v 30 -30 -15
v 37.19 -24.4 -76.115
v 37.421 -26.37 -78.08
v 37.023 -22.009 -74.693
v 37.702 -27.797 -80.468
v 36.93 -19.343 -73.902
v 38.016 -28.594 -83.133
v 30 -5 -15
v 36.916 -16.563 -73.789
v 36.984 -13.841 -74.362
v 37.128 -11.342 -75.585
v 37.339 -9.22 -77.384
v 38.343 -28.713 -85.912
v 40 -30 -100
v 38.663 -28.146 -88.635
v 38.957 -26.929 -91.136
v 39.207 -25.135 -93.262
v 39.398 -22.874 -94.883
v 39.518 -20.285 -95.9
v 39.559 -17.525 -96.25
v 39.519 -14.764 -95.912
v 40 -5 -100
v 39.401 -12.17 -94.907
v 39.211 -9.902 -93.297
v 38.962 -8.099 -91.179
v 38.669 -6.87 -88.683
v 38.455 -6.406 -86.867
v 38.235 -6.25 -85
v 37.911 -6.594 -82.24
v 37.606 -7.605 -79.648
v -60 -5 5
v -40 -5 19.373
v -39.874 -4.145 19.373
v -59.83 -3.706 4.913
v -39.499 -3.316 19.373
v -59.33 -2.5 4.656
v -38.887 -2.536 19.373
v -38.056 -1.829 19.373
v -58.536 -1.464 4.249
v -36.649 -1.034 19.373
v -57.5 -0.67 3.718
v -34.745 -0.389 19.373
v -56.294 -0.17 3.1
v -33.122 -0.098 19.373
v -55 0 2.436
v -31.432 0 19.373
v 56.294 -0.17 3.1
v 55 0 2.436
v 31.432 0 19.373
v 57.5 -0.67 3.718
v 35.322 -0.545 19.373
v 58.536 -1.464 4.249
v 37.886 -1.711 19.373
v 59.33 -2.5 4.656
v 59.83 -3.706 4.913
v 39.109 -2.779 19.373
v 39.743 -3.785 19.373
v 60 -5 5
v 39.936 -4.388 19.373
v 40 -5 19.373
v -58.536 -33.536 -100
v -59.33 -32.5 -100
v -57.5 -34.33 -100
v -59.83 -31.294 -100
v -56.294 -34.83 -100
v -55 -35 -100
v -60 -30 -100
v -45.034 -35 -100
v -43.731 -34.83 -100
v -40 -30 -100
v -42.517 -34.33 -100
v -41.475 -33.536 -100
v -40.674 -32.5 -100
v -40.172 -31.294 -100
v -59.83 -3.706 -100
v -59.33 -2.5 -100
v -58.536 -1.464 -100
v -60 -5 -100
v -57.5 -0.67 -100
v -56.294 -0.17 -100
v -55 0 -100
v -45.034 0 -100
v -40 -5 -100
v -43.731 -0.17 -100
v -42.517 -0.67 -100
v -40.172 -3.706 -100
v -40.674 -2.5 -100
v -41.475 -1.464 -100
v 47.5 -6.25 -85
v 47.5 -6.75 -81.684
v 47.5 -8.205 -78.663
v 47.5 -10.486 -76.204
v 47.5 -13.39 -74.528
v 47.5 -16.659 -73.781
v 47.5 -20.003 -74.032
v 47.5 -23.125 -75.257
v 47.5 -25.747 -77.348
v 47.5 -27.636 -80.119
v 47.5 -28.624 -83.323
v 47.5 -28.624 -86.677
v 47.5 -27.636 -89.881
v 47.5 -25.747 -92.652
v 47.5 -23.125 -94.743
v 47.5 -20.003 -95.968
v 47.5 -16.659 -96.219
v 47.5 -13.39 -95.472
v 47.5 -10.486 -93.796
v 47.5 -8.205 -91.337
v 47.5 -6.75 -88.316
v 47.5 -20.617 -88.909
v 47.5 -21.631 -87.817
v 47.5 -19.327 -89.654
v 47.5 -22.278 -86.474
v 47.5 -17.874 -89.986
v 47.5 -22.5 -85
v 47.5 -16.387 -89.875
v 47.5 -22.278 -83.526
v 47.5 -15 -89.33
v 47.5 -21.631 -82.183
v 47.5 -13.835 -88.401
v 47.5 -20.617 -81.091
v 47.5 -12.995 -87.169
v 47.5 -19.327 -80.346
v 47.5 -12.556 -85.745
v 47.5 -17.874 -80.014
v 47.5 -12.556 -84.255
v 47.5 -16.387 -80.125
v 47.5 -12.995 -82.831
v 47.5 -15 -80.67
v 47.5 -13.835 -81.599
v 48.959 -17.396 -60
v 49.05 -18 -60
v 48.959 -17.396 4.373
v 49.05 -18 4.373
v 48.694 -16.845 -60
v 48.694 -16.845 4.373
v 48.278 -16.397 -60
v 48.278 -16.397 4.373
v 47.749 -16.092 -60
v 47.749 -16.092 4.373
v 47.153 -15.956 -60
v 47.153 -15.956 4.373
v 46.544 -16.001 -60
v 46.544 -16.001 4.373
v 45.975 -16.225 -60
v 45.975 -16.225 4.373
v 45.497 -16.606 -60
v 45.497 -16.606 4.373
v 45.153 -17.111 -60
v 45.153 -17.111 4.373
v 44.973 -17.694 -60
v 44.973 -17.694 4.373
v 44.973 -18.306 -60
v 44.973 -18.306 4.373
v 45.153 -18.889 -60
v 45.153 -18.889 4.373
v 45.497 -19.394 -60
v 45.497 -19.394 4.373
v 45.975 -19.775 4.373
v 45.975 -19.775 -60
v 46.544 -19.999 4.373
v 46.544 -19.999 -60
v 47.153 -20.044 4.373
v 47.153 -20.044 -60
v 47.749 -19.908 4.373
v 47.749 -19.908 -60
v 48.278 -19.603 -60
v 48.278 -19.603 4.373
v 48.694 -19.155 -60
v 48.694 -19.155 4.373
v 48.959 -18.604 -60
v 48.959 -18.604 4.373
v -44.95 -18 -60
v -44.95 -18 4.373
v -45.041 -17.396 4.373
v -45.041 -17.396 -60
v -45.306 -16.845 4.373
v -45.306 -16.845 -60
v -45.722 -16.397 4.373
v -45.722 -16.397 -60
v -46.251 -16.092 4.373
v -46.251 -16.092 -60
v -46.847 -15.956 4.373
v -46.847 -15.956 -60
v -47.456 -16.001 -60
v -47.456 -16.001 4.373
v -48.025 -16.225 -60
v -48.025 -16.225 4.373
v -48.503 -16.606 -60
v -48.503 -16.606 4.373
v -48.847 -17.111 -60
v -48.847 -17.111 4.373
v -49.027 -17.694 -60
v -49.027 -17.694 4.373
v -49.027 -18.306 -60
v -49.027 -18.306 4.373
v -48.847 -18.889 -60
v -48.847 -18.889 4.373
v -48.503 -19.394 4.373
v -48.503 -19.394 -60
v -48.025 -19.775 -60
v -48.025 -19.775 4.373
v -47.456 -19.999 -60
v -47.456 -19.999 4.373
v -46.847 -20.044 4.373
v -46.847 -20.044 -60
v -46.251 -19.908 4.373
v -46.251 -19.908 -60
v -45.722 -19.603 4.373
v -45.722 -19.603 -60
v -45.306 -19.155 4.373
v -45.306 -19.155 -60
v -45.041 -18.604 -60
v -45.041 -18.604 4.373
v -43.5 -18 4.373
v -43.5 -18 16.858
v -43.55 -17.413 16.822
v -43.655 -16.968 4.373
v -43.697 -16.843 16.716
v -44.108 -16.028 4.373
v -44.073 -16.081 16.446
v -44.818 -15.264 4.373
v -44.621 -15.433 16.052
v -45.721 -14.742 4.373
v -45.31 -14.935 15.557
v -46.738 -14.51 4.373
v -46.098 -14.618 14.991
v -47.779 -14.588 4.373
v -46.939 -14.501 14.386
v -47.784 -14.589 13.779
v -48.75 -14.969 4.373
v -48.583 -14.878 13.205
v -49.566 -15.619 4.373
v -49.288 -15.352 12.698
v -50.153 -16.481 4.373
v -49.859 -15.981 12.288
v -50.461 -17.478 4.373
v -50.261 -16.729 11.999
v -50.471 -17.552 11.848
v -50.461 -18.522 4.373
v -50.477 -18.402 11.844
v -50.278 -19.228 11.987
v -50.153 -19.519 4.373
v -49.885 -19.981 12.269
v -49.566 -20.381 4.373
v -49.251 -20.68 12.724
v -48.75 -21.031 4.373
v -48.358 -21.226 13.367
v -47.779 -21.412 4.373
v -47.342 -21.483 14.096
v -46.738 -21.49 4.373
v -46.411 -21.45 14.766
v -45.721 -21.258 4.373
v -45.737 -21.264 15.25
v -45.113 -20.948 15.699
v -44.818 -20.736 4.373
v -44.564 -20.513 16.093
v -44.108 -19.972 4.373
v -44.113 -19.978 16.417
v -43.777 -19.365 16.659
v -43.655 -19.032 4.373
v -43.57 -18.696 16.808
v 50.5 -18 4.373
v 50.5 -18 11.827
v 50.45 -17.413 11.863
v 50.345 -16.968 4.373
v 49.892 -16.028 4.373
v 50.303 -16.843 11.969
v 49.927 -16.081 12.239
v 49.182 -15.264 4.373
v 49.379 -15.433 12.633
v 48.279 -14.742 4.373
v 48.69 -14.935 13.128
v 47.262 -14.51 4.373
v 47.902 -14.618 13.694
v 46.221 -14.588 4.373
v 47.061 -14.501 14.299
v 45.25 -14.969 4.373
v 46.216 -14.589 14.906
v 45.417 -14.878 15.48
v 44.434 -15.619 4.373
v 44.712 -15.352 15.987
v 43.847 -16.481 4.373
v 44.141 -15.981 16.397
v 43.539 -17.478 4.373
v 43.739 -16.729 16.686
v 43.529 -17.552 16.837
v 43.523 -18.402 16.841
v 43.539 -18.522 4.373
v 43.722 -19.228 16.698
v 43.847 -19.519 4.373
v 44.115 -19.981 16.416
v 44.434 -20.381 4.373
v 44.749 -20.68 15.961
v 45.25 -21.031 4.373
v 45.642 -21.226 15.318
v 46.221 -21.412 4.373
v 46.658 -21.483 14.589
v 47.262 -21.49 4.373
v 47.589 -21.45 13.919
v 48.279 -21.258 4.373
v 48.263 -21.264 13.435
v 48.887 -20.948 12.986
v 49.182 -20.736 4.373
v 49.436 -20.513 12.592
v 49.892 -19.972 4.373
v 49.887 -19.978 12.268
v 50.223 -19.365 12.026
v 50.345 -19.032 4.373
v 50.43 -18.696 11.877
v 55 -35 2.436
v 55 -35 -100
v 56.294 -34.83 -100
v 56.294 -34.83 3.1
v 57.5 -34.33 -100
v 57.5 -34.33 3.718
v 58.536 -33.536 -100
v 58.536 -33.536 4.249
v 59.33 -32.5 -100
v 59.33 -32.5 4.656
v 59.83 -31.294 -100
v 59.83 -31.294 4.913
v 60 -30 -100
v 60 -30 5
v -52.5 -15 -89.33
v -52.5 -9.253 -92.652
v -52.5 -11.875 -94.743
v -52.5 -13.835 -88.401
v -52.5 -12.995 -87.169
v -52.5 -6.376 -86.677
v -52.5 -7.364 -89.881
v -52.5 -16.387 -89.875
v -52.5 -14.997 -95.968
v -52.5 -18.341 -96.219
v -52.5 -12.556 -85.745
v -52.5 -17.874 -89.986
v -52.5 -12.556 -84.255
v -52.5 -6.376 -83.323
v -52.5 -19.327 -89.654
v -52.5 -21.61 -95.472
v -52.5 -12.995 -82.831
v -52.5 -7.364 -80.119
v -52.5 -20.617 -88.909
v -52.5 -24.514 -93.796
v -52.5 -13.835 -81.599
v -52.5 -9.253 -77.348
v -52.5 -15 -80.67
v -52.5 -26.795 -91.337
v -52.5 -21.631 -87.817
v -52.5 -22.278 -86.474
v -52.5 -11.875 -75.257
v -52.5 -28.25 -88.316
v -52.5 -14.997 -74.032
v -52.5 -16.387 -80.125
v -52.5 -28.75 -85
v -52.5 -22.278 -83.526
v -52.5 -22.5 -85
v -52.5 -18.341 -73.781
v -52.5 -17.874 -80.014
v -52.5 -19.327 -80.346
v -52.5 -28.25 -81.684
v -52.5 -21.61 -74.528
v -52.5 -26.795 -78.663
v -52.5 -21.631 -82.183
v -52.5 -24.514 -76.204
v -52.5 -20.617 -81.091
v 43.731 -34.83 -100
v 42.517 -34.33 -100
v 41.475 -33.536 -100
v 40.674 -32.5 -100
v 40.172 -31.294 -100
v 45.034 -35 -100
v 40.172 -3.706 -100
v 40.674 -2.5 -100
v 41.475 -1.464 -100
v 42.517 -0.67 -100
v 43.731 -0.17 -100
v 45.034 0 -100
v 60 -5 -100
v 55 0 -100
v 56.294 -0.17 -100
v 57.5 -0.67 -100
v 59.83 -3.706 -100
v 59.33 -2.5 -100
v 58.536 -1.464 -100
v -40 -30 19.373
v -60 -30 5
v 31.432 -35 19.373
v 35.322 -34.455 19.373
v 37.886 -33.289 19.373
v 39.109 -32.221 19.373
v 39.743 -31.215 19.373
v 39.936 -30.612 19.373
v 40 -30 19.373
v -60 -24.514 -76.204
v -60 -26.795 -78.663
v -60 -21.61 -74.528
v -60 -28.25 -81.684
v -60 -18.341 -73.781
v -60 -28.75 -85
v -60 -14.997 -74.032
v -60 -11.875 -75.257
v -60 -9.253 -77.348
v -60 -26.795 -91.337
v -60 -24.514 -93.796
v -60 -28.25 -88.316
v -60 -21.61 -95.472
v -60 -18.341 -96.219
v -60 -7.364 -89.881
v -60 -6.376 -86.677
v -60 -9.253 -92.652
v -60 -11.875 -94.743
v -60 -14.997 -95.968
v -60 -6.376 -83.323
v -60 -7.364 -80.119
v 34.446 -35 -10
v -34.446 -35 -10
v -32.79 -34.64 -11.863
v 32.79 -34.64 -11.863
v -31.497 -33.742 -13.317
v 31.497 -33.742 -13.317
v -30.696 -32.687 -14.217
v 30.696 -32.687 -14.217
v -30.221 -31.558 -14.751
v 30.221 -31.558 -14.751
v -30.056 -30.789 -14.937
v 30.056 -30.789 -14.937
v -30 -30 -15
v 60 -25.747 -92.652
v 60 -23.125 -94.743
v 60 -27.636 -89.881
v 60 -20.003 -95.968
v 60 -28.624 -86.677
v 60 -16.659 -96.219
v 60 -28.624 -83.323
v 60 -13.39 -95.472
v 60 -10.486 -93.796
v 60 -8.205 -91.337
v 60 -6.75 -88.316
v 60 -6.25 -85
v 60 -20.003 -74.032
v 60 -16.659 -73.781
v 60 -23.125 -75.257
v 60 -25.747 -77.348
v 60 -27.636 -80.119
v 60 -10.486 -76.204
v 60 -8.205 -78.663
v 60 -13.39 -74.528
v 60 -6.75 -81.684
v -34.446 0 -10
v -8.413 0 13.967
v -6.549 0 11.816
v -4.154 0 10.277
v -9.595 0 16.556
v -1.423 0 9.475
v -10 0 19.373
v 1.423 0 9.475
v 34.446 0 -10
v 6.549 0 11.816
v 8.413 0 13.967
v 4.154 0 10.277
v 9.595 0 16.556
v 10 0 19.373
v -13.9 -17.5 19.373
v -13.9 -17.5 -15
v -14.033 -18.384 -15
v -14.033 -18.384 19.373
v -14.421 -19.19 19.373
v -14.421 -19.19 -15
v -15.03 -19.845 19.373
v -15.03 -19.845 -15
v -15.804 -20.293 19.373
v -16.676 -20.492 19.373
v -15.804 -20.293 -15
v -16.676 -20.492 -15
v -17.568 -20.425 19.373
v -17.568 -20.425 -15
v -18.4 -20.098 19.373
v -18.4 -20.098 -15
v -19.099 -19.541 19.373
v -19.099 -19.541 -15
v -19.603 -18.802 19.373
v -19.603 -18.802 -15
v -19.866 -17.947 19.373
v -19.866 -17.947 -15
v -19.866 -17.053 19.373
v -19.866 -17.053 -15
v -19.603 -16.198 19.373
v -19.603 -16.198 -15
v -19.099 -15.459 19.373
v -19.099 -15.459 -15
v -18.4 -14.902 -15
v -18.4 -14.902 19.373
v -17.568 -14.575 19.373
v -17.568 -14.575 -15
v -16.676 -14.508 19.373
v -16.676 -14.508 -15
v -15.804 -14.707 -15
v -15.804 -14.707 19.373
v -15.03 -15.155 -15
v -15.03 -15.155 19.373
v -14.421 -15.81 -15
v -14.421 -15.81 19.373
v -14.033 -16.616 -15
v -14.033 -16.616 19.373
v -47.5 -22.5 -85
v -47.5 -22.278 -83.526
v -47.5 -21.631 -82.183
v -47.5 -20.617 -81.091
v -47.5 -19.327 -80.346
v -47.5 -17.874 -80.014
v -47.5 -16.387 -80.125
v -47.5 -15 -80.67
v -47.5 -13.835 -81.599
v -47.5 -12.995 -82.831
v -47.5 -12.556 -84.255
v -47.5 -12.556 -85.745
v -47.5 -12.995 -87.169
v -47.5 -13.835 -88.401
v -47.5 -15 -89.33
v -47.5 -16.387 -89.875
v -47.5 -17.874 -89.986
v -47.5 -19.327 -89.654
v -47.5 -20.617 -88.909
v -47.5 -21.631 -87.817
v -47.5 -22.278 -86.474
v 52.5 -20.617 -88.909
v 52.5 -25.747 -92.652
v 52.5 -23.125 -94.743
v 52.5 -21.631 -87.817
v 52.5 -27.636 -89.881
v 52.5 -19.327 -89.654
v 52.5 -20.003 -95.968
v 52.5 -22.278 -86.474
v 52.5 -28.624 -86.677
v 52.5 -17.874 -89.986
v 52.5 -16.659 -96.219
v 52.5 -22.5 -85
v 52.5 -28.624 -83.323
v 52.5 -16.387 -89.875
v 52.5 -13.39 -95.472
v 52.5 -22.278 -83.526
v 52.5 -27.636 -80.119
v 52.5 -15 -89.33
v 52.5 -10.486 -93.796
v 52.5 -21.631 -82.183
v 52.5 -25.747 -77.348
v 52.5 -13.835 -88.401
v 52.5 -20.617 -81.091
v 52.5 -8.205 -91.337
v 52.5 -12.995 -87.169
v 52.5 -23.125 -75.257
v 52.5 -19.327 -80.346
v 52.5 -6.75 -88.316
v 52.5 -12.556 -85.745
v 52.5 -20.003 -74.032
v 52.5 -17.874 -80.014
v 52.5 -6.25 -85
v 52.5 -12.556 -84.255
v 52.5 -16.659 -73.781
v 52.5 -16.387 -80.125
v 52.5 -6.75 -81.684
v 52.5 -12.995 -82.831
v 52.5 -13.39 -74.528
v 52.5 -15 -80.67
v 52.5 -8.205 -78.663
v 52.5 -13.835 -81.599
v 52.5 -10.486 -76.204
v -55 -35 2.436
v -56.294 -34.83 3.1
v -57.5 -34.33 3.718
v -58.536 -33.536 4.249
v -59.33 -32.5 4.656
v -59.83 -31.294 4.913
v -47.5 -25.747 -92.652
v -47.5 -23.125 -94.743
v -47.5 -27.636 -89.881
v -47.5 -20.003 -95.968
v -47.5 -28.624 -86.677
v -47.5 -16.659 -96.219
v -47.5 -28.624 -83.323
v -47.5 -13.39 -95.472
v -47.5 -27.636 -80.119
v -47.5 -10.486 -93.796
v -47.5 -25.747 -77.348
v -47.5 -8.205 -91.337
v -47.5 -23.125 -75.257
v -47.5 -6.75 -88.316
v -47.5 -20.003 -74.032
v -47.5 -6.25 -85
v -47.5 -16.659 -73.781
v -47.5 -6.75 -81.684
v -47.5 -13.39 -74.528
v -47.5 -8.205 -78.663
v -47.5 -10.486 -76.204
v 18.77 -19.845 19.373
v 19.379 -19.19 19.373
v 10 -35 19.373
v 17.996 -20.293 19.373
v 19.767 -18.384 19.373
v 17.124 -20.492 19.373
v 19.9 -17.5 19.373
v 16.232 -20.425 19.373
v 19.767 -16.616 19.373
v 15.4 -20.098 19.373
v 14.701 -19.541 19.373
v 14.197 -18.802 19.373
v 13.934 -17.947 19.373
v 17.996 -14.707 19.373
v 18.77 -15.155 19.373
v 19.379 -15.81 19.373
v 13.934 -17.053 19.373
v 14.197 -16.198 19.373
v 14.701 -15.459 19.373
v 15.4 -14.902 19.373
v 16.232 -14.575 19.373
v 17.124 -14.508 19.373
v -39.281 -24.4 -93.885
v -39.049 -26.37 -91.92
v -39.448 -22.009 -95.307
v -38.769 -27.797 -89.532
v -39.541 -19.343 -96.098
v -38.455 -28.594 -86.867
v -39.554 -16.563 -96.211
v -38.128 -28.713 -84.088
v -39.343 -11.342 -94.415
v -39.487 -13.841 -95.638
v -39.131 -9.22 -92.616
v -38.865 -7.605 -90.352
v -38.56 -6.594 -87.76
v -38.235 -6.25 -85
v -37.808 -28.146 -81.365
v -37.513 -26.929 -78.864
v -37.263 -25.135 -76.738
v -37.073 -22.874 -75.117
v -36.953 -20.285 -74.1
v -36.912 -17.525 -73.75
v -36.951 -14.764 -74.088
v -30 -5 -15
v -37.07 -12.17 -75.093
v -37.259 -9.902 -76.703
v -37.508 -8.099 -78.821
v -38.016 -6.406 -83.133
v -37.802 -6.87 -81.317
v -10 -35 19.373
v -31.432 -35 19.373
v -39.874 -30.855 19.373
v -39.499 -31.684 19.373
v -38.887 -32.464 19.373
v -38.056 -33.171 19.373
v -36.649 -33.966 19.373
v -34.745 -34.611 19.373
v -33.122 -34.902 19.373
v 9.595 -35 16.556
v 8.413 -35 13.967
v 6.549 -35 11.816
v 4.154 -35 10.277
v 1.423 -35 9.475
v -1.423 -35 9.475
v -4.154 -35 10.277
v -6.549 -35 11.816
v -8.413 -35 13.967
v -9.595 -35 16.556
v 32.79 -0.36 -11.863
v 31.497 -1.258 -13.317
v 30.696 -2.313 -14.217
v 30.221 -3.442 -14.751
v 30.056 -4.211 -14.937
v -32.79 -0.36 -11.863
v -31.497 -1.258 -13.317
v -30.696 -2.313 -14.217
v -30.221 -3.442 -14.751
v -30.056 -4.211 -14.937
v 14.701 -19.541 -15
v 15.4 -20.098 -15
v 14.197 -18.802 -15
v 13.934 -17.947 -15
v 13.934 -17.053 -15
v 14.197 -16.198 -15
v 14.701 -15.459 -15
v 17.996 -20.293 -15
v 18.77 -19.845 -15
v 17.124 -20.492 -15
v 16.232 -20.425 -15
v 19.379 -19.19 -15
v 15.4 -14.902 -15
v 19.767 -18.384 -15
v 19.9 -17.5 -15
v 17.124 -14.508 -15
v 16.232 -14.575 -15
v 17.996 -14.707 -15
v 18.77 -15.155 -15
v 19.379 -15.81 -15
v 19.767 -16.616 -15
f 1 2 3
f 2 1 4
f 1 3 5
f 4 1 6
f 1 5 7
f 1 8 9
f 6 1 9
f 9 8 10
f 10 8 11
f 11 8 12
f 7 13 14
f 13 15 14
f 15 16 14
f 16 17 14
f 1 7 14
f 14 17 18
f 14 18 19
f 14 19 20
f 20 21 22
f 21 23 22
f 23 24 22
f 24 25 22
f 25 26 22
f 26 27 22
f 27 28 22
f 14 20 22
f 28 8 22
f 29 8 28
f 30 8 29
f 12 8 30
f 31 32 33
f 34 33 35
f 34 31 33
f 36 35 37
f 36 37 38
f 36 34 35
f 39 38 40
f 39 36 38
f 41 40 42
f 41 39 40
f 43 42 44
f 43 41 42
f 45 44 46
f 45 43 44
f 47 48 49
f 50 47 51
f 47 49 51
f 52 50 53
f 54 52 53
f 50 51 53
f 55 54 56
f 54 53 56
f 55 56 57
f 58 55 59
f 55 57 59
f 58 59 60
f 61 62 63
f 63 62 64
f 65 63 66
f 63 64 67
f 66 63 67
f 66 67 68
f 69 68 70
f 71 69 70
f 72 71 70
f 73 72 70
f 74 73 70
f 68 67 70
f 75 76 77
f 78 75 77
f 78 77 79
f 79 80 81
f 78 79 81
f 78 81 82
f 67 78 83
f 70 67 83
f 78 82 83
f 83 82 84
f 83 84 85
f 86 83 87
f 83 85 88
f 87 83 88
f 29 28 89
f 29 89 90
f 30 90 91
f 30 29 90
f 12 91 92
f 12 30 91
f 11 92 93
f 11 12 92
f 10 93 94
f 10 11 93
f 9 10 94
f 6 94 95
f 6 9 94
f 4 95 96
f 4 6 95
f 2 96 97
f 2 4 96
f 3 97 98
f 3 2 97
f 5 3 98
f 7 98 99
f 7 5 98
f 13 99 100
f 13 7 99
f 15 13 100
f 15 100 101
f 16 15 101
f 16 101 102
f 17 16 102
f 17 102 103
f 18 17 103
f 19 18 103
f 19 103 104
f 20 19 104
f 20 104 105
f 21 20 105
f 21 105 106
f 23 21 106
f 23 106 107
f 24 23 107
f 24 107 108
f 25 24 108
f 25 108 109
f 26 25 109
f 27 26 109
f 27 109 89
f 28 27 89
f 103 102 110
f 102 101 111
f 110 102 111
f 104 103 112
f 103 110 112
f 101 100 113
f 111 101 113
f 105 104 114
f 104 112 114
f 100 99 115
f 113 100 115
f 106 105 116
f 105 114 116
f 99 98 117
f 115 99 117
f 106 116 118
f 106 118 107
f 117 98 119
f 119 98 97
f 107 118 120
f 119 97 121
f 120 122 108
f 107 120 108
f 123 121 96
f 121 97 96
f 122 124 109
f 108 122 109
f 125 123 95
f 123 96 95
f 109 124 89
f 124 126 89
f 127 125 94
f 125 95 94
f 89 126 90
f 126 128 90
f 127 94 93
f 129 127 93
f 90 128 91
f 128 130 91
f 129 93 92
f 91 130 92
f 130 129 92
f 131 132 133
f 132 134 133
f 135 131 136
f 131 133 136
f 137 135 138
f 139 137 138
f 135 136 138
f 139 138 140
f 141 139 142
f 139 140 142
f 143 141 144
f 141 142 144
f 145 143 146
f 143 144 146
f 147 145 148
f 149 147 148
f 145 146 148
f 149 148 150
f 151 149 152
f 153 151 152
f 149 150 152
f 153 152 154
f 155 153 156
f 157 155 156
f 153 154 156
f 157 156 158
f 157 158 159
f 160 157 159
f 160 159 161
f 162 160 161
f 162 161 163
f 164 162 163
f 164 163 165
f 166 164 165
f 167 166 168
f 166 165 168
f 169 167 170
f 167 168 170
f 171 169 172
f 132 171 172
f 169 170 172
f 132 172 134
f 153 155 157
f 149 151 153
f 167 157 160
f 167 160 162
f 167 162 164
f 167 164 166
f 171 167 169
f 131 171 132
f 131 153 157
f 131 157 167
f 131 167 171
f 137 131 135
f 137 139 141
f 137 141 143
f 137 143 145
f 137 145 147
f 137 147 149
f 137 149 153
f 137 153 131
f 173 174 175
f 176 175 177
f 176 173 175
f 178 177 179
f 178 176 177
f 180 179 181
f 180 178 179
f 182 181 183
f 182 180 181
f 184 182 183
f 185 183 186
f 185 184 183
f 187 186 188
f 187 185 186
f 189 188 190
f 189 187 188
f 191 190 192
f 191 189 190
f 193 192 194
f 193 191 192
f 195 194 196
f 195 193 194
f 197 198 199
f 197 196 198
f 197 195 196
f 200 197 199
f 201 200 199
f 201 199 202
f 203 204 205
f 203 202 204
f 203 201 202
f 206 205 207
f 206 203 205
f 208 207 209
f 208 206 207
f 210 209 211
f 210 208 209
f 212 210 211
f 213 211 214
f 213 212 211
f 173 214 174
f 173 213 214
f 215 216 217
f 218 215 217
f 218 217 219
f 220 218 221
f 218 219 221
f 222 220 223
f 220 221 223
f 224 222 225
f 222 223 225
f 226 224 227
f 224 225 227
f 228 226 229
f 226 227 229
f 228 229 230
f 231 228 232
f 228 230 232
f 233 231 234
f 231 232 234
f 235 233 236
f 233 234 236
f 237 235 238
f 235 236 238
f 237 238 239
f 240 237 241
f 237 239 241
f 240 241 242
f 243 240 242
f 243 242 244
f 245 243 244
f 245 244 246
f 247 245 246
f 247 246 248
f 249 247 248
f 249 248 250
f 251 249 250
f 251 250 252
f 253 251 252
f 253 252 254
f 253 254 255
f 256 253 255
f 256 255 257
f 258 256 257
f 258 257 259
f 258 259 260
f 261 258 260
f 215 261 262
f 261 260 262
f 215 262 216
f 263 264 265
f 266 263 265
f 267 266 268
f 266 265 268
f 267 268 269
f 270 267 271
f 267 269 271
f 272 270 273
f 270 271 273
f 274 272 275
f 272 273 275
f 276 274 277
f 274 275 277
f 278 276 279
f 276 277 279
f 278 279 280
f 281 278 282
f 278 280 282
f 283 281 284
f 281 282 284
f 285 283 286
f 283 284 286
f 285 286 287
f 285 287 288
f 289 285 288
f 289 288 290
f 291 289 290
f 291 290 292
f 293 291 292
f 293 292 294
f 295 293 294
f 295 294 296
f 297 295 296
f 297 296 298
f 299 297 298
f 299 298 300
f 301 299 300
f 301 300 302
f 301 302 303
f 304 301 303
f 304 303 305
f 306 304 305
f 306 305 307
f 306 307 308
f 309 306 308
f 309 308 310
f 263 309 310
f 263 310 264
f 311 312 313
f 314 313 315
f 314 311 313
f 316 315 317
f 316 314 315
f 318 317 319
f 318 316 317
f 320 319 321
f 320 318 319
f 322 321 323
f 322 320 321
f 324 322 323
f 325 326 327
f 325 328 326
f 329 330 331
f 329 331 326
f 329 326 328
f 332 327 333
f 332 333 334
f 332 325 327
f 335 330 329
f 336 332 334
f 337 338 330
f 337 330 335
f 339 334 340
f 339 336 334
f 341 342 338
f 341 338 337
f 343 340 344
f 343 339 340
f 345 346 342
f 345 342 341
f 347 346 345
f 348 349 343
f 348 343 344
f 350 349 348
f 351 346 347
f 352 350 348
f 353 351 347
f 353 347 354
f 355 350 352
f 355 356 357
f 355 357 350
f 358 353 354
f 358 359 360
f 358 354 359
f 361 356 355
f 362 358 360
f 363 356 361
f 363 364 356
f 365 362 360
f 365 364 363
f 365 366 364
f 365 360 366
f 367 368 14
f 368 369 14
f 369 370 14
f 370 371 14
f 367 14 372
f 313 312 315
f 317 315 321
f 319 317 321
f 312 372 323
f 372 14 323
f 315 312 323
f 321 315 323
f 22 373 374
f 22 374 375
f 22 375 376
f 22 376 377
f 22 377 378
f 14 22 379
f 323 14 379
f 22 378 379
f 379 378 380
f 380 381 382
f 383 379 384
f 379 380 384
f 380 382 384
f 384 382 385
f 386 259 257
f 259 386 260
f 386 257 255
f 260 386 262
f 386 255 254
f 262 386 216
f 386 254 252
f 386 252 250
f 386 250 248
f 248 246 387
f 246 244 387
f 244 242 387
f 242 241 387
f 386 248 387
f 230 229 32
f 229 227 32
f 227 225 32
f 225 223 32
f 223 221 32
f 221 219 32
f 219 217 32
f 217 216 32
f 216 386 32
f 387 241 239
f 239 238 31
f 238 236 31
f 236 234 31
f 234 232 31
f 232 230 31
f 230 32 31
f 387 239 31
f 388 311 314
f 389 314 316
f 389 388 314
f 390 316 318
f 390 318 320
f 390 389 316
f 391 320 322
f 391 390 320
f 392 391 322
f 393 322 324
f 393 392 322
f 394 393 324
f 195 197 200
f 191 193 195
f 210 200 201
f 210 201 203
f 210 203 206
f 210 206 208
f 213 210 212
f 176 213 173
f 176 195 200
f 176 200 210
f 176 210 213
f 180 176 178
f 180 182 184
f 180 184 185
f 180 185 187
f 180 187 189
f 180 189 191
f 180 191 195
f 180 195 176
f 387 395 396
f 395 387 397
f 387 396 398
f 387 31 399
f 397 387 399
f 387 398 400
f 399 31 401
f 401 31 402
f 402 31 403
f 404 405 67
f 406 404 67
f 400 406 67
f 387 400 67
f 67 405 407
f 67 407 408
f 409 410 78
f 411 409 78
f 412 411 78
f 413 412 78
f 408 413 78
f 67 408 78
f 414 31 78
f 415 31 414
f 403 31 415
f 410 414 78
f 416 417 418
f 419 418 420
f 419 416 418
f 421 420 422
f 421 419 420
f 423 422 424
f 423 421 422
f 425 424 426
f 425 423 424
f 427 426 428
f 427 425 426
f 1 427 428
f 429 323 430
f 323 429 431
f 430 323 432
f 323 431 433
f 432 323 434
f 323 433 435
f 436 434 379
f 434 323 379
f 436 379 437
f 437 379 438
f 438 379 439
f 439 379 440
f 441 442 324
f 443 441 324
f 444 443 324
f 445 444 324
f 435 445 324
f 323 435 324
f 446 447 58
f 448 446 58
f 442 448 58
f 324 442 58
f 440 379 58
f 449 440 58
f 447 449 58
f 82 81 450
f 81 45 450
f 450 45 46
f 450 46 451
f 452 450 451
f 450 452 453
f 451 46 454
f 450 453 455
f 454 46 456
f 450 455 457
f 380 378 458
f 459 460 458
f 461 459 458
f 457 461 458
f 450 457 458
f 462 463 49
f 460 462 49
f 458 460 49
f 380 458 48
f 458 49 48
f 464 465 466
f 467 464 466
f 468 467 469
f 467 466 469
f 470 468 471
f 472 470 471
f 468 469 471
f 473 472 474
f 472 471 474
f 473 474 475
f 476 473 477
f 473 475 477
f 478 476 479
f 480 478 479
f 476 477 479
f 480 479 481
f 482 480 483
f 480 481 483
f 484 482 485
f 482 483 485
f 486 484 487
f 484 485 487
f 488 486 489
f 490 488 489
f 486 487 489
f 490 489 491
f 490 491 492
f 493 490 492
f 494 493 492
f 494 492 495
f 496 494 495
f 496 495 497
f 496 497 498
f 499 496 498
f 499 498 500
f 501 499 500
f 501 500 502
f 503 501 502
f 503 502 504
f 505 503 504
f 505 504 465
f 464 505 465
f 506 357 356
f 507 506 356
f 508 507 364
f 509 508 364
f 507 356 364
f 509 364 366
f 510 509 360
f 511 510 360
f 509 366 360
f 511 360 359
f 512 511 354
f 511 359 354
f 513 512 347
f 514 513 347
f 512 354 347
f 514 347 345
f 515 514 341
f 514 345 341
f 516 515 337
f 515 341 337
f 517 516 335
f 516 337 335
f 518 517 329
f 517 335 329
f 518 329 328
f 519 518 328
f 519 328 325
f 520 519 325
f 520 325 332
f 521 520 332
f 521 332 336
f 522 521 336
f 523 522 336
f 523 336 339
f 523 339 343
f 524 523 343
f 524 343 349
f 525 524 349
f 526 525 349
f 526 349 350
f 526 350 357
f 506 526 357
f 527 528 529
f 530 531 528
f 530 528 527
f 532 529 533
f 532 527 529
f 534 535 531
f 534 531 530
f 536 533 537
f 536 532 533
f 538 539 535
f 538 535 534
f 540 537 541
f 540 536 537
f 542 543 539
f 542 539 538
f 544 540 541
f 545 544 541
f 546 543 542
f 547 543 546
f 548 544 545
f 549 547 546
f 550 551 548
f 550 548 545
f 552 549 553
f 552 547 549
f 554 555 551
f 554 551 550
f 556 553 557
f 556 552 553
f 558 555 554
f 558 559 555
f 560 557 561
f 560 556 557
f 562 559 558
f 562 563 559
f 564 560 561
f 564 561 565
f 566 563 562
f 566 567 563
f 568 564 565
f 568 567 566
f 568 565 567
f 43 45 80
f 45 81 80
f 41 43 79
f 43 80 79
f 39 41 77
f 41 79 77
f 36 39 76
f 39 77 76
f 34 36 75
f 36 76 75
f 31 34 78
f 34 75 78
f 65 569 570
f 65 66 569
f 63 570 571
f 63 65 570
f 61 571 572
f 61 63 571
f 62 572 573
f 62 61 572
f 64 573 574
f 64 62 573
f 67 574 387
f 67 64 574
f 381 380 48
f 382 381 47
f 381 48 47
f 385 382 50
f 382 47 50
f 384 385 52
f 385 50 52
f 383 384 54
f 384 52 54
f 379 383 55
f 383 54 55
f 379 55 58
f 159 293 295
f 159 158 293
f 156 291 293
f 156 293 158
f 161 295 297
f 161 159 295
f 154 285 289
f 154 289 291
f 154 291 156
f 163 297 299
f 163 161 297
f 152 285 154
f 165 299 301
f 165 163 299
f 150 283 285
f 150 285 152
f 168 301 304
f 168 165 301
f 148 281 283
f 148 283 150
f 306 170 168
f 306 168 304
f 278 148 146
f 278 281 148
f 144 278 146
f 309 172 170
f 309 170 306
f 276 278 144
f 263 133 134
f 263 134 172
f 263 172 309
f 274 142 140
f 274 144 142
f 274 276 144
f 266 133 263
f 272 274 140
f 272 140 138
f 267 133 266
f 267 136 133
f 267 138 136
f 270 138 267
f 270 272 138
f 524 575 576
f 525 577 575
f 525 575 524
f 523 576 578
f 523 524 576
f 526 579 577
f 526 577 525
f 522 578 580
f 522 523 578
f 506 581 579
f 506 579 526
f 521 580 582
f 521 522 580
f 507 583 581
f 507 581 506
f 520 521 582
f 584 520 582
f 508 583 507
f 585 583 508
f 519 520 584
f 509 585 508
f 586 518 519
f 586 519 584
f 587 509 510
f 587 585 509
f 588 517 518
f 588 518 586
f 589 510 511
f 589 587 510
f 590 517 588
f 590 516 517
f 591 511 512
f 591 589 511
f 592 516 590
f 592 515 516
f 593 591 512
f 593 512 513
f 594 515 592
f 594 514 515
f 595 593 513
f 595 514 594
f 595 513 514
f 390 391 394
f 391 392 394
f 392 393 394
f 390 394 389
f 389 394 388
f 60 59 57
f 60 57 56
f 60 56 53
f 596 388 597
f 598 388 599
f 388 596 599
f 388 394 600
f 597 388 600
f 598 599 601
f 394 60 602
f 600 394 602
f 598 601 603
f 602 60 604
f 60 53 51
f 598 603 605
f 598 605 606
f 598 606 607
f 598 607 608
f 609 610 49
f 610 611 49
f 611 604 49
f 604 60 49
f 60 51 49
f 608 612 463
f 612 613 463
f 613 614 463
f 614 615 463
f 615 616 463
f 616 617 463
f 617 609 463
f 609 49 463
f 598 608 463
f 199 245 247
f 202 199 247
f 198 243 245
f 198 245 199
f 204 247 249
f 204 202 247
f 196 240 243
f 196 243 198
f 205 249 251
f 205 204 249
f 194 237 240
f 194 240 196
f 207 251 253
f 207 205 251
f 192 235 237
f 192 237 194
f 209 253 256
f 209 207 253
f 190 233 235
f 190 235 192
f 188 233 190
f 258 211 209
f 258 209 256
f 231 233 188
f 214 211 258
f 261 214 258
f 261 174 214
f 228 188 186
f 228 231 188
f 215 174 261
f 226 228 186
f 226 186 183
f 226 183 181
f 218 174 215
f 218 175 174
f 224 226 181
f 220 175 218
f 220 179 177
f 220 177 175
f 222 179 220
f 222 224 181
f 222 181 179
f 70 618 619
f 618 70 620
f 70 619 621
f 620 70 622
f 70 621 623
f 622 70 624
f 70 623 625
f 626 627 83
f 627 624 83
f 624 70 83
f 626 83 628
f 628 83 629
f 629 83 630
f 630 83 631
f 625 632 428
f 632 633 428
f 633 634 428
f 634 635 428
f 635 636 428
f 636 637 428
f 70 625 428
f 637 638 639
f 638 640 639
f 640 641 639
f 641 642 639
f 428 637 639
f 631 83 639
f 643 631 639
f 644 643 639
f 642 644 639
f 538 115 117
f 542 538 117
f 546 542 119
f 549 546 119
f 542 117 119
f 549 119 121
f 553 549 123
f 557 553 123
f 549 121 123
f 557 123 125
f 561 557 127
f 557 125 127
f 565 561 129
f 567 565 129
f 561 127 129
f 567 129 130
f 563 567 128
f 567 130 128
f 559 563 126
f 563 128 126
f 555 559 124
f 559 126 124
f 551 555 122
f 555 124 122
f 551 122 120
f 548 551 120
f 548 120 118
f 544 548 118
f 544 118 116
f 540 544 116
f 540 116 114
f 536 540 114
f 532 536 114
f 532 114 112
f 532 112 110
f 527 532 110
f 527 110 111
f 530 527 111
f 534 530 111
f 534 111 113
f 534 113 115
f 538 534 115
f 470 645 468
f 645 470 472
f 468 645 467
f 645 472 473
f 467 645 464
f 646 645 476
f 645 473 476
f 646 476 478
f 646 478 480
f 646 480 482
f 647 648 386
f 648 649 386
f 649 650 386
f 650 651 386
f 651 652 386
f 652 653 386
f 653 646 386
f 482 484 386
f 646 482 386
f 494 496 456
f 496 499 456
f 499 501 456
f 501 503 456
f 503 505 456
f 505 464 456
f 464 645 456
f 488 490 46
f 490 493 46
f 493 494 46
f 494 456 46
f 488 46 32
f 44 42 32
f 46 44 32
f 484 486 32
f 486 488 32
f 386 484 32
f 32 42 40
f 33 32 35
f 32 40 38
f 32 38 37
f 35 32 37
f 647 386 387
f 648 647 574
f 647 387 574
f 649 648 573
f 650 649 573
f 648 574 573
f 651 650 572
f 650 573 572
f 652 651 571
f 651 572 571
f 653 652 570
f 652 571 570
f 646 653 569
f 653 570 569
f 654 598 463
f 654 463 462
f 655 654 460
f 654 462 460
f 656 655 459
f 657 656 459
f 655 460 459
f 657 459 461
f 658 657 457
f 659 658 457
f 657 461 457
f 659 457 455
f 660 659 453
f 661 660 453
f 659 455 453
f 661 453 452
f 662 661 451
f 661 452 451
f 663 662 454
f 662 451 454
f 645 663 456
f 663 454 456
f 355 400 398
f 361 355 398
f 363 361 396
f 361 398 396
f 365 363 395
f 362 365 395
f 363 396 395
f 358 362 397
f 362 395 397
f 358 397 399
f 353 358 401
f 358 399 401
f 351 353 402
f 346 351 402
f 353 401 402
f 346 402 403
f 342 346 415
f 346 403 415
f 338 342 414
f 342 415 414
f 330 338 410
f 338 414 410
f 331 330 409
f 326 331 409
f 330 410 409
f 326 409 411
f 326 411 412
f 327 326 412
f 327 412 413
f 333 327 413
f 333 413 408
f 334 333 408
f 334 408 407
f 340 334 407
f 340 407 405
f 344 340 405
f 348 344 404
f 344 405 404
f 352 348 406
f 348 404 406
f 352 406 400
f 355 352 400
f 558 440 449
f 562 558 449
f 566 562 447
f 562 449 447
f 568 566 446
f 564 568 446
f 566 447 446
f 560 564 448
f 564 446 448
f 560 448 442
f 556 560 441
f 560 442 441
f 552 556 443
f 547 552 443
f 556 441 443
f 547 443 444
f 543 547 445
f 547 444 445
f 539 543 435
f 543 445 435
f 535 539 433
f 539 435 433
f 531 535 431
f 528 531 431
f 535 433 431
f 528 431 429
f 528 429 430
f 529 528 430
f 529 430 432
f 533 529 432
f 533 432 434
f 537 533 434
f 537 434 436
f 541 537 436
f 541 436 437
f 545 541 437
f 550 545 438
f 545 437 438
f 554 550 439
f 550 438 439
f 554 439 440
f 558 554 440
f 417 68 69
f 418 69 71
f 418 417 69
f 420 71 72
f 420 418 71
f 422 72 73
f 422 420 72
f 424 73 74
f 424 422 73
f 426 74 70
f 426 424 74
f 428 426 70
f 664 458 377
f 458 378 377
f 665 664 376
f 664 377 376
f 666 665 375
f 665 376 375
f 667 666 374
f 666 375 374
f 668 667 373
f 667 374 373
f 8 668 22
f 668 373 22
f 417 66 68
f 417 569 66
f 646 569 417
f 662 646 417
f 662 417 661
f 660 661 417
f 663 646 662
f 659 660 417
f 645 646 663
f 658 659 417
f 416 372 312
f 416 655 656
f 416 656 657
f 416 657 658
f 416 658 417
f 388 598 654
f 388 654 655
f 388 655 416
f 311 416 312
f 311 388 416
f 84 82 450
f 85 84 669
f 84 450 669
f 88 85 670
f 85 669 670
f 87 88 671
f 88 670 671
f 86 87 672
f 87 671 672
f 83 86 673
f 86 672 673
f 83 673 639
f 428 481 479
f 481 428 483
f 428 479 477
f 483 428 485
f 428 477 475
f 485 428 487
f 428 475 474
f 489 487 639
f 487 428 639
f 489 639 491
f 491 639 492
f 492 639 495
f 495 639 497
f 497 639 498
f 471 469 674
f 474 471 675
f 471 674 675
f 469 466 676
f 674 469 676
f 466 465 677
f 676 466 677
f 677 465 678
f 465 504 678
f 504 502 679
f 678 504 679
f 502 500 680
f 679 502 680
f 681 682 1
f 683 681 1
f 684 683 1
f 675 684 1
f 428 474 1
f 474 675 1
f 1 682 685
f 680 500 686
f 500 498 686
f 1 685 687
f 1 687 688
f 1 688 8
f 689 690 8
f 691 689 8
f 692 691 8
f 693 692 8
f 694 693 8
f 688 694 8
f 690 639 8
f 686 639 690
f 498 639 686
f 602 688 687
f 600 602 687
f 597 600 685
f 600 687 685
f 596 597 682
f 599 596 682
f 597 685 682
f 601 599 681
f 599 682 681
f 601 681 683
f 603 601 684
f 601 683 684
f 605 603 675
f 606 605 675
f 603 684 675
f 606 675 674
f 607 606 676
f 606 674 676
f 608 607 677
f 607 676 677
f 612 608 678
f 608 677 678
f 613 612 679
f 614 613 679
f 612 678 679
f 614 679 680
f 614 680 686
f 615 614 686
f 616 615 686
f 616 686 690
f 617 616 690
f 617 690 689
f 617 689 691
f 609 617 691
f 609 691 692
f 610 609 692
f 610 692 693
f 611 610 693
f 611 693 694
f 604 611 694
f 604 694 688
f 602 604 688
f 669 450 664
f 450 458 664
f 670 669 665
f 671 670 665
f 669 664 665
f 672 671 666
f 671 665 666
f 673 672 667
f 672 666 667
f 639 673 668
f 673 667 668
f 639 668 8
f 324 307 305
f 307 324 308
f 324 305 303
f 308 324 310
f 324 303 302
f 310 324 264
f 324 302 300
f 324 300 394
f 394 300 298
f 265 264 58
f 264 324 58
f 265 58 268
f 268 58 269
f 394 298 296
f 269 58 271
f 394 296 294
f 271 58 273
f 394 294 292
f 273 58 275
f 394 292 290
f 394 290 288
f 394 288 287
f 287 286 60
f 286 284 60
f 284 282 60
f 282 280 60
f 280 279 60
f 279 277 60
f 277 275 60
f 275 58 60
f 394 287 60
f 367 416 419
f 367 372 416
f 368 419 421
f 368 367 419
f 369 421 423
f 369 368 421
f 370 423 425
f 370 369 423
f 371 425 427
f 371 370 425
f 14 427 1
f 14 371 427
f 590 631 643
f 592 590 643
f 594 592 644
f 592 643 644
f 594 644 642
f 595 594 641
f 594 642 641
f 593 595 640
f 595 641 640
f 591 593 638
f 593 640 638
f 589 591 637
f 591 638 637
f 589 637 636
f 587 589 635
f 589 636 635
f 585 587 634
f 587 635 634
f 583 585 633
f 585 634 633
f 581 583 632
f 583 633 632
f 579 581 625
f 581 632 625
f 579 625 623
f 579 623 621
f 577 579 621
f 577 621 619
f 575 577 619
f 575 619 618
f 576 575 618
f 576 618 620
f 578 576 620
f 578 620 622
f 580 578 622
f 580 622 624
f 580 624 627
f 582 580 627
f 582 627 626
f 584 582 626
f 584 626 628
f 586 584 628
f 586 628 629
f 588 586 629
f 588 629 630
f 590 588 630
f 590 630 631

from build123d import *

# Parameters (mm, degrees)
F1_DEPTH  = 35
F2_R      = 3
F3_DEPTH  = 34.3740698971
F4_R      = 5
F5_DEPTH  = 120.001
F6_R      = 11.25
F7_DEPTH  = 7.5
F8_R      = 11.25
F9_DEPTH  = 7.5
F10_R     = 11.25
F11_DEPTH = 47.5
F12_R     = 11.25
F13_DEPTH = 47.5
F14_R     = 2.05
F15_DEPTH = 60
F16_R     = 3.5
F17_DEPTH = 15
F18_R     = 5


with BuildPart() as f1:
    # F0 (on Front) → F1 (new body)
    with BuildSketch(Plane.XZ):
        with BuildLine():
            Line((-40, 19.3730698971), (-60, 5))
            Line((-60, 5), (-60, 0))
            Line((-60, 0), (-60, -100))
            Line((-60, -100), (-40, -100))
            Line((-40, -100), (-30, -15))
            Line((-30, -15), (0, -15))
            Line((0, -15), (30, -15))
            Line((30, -15), (40, -100))
            Line((40, -100), (60, -100))
            Line((60, -100), (60, 0))
            Line((60, 0), (60, 5))
            Line((60, 5), (40, 19.3730698971))
            Line((40, 19.3730698971), (10, 19.3730698971))
            ThreePointArc((10, 19.3730698971), (0, 9.3730698971), (-10, 19.3730698971))
            Line((-10, 19.3730698971), (-40, 19.3730698971))
        make_face()
    extrude(amount=F1_DEPTH)

    # F2 (on face) → F3 (cut, through all)
    with BuildSketch(Plane(origin=(0, 0, -15), x_dir=(1, 0, 0), z_dir=(0, 0, -1))):
        with Locations((-16.9, 17.5)):
            Circle(F2_R)
        with Locations((16.9, 17.5)):
            Circle(F2_R)
    extrude(amount=-F3_DEPTH, mode=Mode.SUBTRACT)

    # F4 (on face) → F5 (cut, through all)
    with BuildSketch(Plane(origin=(-60, 0, 0), x_dir=(0, -1, 0), z_dir=(-1, 0, 0))):
        with Locations((17.5, -85)):
            Circle(F4_R)
    extrude(amount=-F5_DEPTH, mode=Mode.SUBTRACT)

    # F6 (on face) → F7 (cut)
    with BuildSketch(Plane(origin=(-60, 0, 0), x_dir=(0, -1, 0), z_dir=(-1, 0, 0))):
        with Locations((17.5, -85)):
            Circle(F6_R)
    extrude(amount=-F7_DEPTH, mode=Mode.SUBTRACT)

    # F8 (on face) → F9 (cut)
    with BuildSketch(Plane.YZ.offset(60)):
        with Locations((-17.5, -85)):
            Circle(F8_R)
    extrude(amount=-F9_DEPTH, mode=Mode.SUBTRACT)

    # F10 (on Right) → F11 (cut)
    with BuildSketch(Plane.YZ):
        with Locations((-17.5, -85)):
            Circle(F10_R)
    extrude(amount=-F11_DEPTH, mode=Mode.SUBTRACT)

    # F12 (on Right) → F13 (cut)
    with BuildSketch(Plane.YZ):
        with Locations((-17.5, -85)):
            Circle(F12_R)
    extrude(amount=F13_DEPTH, mode=Mode.SUBTRACT)

    # F14 (on Top) → F15 (cut, symmetric)
    with BuildSketch(Plane.XY):
        with Locations((-47, -18)):
            Circle(F14_R)
        with Locations((47, -18)):
            Circle(F14_R)
    extrude(amount=F15_DEPTH, both=True, mode=Mode.SUBTRACT)

    # F16 (on face) → F17 (cut)
    with BuildSketch(Plane.XY.offset(19.3730698971)):
        with Locations((-47, -18)):
            Circle(F16_R)
        with Locations((47, -18)):
            Circle(F16_R)
    extrude(amount=-F17_DEPTH, mode=Mode.SUBTRACT)

    # F18
    f18_edges = [f1.edges().sort_by_distance(p)[0] for p in [
        (60, -35, -47.5),
        (60, 0, -47.5),
        (-60, -35, -47.5),
        (-60, 0, -47.5),
        (-50, 0, 12.186535),
        (-50, -35, 12.186535),
        (50, -35, 12.186535),
        (50, 0, 12.186535),
        (35, 0, -57.5),
        (0, 0, -15),
        (0, -35, -15),
        (-35, -35, -57.5),
        (35, -35, -57.5),
        (-35, 0, -57.5),
    ]]
    fillet(f18_edges, radius=F18_R)


solid = f1.part
